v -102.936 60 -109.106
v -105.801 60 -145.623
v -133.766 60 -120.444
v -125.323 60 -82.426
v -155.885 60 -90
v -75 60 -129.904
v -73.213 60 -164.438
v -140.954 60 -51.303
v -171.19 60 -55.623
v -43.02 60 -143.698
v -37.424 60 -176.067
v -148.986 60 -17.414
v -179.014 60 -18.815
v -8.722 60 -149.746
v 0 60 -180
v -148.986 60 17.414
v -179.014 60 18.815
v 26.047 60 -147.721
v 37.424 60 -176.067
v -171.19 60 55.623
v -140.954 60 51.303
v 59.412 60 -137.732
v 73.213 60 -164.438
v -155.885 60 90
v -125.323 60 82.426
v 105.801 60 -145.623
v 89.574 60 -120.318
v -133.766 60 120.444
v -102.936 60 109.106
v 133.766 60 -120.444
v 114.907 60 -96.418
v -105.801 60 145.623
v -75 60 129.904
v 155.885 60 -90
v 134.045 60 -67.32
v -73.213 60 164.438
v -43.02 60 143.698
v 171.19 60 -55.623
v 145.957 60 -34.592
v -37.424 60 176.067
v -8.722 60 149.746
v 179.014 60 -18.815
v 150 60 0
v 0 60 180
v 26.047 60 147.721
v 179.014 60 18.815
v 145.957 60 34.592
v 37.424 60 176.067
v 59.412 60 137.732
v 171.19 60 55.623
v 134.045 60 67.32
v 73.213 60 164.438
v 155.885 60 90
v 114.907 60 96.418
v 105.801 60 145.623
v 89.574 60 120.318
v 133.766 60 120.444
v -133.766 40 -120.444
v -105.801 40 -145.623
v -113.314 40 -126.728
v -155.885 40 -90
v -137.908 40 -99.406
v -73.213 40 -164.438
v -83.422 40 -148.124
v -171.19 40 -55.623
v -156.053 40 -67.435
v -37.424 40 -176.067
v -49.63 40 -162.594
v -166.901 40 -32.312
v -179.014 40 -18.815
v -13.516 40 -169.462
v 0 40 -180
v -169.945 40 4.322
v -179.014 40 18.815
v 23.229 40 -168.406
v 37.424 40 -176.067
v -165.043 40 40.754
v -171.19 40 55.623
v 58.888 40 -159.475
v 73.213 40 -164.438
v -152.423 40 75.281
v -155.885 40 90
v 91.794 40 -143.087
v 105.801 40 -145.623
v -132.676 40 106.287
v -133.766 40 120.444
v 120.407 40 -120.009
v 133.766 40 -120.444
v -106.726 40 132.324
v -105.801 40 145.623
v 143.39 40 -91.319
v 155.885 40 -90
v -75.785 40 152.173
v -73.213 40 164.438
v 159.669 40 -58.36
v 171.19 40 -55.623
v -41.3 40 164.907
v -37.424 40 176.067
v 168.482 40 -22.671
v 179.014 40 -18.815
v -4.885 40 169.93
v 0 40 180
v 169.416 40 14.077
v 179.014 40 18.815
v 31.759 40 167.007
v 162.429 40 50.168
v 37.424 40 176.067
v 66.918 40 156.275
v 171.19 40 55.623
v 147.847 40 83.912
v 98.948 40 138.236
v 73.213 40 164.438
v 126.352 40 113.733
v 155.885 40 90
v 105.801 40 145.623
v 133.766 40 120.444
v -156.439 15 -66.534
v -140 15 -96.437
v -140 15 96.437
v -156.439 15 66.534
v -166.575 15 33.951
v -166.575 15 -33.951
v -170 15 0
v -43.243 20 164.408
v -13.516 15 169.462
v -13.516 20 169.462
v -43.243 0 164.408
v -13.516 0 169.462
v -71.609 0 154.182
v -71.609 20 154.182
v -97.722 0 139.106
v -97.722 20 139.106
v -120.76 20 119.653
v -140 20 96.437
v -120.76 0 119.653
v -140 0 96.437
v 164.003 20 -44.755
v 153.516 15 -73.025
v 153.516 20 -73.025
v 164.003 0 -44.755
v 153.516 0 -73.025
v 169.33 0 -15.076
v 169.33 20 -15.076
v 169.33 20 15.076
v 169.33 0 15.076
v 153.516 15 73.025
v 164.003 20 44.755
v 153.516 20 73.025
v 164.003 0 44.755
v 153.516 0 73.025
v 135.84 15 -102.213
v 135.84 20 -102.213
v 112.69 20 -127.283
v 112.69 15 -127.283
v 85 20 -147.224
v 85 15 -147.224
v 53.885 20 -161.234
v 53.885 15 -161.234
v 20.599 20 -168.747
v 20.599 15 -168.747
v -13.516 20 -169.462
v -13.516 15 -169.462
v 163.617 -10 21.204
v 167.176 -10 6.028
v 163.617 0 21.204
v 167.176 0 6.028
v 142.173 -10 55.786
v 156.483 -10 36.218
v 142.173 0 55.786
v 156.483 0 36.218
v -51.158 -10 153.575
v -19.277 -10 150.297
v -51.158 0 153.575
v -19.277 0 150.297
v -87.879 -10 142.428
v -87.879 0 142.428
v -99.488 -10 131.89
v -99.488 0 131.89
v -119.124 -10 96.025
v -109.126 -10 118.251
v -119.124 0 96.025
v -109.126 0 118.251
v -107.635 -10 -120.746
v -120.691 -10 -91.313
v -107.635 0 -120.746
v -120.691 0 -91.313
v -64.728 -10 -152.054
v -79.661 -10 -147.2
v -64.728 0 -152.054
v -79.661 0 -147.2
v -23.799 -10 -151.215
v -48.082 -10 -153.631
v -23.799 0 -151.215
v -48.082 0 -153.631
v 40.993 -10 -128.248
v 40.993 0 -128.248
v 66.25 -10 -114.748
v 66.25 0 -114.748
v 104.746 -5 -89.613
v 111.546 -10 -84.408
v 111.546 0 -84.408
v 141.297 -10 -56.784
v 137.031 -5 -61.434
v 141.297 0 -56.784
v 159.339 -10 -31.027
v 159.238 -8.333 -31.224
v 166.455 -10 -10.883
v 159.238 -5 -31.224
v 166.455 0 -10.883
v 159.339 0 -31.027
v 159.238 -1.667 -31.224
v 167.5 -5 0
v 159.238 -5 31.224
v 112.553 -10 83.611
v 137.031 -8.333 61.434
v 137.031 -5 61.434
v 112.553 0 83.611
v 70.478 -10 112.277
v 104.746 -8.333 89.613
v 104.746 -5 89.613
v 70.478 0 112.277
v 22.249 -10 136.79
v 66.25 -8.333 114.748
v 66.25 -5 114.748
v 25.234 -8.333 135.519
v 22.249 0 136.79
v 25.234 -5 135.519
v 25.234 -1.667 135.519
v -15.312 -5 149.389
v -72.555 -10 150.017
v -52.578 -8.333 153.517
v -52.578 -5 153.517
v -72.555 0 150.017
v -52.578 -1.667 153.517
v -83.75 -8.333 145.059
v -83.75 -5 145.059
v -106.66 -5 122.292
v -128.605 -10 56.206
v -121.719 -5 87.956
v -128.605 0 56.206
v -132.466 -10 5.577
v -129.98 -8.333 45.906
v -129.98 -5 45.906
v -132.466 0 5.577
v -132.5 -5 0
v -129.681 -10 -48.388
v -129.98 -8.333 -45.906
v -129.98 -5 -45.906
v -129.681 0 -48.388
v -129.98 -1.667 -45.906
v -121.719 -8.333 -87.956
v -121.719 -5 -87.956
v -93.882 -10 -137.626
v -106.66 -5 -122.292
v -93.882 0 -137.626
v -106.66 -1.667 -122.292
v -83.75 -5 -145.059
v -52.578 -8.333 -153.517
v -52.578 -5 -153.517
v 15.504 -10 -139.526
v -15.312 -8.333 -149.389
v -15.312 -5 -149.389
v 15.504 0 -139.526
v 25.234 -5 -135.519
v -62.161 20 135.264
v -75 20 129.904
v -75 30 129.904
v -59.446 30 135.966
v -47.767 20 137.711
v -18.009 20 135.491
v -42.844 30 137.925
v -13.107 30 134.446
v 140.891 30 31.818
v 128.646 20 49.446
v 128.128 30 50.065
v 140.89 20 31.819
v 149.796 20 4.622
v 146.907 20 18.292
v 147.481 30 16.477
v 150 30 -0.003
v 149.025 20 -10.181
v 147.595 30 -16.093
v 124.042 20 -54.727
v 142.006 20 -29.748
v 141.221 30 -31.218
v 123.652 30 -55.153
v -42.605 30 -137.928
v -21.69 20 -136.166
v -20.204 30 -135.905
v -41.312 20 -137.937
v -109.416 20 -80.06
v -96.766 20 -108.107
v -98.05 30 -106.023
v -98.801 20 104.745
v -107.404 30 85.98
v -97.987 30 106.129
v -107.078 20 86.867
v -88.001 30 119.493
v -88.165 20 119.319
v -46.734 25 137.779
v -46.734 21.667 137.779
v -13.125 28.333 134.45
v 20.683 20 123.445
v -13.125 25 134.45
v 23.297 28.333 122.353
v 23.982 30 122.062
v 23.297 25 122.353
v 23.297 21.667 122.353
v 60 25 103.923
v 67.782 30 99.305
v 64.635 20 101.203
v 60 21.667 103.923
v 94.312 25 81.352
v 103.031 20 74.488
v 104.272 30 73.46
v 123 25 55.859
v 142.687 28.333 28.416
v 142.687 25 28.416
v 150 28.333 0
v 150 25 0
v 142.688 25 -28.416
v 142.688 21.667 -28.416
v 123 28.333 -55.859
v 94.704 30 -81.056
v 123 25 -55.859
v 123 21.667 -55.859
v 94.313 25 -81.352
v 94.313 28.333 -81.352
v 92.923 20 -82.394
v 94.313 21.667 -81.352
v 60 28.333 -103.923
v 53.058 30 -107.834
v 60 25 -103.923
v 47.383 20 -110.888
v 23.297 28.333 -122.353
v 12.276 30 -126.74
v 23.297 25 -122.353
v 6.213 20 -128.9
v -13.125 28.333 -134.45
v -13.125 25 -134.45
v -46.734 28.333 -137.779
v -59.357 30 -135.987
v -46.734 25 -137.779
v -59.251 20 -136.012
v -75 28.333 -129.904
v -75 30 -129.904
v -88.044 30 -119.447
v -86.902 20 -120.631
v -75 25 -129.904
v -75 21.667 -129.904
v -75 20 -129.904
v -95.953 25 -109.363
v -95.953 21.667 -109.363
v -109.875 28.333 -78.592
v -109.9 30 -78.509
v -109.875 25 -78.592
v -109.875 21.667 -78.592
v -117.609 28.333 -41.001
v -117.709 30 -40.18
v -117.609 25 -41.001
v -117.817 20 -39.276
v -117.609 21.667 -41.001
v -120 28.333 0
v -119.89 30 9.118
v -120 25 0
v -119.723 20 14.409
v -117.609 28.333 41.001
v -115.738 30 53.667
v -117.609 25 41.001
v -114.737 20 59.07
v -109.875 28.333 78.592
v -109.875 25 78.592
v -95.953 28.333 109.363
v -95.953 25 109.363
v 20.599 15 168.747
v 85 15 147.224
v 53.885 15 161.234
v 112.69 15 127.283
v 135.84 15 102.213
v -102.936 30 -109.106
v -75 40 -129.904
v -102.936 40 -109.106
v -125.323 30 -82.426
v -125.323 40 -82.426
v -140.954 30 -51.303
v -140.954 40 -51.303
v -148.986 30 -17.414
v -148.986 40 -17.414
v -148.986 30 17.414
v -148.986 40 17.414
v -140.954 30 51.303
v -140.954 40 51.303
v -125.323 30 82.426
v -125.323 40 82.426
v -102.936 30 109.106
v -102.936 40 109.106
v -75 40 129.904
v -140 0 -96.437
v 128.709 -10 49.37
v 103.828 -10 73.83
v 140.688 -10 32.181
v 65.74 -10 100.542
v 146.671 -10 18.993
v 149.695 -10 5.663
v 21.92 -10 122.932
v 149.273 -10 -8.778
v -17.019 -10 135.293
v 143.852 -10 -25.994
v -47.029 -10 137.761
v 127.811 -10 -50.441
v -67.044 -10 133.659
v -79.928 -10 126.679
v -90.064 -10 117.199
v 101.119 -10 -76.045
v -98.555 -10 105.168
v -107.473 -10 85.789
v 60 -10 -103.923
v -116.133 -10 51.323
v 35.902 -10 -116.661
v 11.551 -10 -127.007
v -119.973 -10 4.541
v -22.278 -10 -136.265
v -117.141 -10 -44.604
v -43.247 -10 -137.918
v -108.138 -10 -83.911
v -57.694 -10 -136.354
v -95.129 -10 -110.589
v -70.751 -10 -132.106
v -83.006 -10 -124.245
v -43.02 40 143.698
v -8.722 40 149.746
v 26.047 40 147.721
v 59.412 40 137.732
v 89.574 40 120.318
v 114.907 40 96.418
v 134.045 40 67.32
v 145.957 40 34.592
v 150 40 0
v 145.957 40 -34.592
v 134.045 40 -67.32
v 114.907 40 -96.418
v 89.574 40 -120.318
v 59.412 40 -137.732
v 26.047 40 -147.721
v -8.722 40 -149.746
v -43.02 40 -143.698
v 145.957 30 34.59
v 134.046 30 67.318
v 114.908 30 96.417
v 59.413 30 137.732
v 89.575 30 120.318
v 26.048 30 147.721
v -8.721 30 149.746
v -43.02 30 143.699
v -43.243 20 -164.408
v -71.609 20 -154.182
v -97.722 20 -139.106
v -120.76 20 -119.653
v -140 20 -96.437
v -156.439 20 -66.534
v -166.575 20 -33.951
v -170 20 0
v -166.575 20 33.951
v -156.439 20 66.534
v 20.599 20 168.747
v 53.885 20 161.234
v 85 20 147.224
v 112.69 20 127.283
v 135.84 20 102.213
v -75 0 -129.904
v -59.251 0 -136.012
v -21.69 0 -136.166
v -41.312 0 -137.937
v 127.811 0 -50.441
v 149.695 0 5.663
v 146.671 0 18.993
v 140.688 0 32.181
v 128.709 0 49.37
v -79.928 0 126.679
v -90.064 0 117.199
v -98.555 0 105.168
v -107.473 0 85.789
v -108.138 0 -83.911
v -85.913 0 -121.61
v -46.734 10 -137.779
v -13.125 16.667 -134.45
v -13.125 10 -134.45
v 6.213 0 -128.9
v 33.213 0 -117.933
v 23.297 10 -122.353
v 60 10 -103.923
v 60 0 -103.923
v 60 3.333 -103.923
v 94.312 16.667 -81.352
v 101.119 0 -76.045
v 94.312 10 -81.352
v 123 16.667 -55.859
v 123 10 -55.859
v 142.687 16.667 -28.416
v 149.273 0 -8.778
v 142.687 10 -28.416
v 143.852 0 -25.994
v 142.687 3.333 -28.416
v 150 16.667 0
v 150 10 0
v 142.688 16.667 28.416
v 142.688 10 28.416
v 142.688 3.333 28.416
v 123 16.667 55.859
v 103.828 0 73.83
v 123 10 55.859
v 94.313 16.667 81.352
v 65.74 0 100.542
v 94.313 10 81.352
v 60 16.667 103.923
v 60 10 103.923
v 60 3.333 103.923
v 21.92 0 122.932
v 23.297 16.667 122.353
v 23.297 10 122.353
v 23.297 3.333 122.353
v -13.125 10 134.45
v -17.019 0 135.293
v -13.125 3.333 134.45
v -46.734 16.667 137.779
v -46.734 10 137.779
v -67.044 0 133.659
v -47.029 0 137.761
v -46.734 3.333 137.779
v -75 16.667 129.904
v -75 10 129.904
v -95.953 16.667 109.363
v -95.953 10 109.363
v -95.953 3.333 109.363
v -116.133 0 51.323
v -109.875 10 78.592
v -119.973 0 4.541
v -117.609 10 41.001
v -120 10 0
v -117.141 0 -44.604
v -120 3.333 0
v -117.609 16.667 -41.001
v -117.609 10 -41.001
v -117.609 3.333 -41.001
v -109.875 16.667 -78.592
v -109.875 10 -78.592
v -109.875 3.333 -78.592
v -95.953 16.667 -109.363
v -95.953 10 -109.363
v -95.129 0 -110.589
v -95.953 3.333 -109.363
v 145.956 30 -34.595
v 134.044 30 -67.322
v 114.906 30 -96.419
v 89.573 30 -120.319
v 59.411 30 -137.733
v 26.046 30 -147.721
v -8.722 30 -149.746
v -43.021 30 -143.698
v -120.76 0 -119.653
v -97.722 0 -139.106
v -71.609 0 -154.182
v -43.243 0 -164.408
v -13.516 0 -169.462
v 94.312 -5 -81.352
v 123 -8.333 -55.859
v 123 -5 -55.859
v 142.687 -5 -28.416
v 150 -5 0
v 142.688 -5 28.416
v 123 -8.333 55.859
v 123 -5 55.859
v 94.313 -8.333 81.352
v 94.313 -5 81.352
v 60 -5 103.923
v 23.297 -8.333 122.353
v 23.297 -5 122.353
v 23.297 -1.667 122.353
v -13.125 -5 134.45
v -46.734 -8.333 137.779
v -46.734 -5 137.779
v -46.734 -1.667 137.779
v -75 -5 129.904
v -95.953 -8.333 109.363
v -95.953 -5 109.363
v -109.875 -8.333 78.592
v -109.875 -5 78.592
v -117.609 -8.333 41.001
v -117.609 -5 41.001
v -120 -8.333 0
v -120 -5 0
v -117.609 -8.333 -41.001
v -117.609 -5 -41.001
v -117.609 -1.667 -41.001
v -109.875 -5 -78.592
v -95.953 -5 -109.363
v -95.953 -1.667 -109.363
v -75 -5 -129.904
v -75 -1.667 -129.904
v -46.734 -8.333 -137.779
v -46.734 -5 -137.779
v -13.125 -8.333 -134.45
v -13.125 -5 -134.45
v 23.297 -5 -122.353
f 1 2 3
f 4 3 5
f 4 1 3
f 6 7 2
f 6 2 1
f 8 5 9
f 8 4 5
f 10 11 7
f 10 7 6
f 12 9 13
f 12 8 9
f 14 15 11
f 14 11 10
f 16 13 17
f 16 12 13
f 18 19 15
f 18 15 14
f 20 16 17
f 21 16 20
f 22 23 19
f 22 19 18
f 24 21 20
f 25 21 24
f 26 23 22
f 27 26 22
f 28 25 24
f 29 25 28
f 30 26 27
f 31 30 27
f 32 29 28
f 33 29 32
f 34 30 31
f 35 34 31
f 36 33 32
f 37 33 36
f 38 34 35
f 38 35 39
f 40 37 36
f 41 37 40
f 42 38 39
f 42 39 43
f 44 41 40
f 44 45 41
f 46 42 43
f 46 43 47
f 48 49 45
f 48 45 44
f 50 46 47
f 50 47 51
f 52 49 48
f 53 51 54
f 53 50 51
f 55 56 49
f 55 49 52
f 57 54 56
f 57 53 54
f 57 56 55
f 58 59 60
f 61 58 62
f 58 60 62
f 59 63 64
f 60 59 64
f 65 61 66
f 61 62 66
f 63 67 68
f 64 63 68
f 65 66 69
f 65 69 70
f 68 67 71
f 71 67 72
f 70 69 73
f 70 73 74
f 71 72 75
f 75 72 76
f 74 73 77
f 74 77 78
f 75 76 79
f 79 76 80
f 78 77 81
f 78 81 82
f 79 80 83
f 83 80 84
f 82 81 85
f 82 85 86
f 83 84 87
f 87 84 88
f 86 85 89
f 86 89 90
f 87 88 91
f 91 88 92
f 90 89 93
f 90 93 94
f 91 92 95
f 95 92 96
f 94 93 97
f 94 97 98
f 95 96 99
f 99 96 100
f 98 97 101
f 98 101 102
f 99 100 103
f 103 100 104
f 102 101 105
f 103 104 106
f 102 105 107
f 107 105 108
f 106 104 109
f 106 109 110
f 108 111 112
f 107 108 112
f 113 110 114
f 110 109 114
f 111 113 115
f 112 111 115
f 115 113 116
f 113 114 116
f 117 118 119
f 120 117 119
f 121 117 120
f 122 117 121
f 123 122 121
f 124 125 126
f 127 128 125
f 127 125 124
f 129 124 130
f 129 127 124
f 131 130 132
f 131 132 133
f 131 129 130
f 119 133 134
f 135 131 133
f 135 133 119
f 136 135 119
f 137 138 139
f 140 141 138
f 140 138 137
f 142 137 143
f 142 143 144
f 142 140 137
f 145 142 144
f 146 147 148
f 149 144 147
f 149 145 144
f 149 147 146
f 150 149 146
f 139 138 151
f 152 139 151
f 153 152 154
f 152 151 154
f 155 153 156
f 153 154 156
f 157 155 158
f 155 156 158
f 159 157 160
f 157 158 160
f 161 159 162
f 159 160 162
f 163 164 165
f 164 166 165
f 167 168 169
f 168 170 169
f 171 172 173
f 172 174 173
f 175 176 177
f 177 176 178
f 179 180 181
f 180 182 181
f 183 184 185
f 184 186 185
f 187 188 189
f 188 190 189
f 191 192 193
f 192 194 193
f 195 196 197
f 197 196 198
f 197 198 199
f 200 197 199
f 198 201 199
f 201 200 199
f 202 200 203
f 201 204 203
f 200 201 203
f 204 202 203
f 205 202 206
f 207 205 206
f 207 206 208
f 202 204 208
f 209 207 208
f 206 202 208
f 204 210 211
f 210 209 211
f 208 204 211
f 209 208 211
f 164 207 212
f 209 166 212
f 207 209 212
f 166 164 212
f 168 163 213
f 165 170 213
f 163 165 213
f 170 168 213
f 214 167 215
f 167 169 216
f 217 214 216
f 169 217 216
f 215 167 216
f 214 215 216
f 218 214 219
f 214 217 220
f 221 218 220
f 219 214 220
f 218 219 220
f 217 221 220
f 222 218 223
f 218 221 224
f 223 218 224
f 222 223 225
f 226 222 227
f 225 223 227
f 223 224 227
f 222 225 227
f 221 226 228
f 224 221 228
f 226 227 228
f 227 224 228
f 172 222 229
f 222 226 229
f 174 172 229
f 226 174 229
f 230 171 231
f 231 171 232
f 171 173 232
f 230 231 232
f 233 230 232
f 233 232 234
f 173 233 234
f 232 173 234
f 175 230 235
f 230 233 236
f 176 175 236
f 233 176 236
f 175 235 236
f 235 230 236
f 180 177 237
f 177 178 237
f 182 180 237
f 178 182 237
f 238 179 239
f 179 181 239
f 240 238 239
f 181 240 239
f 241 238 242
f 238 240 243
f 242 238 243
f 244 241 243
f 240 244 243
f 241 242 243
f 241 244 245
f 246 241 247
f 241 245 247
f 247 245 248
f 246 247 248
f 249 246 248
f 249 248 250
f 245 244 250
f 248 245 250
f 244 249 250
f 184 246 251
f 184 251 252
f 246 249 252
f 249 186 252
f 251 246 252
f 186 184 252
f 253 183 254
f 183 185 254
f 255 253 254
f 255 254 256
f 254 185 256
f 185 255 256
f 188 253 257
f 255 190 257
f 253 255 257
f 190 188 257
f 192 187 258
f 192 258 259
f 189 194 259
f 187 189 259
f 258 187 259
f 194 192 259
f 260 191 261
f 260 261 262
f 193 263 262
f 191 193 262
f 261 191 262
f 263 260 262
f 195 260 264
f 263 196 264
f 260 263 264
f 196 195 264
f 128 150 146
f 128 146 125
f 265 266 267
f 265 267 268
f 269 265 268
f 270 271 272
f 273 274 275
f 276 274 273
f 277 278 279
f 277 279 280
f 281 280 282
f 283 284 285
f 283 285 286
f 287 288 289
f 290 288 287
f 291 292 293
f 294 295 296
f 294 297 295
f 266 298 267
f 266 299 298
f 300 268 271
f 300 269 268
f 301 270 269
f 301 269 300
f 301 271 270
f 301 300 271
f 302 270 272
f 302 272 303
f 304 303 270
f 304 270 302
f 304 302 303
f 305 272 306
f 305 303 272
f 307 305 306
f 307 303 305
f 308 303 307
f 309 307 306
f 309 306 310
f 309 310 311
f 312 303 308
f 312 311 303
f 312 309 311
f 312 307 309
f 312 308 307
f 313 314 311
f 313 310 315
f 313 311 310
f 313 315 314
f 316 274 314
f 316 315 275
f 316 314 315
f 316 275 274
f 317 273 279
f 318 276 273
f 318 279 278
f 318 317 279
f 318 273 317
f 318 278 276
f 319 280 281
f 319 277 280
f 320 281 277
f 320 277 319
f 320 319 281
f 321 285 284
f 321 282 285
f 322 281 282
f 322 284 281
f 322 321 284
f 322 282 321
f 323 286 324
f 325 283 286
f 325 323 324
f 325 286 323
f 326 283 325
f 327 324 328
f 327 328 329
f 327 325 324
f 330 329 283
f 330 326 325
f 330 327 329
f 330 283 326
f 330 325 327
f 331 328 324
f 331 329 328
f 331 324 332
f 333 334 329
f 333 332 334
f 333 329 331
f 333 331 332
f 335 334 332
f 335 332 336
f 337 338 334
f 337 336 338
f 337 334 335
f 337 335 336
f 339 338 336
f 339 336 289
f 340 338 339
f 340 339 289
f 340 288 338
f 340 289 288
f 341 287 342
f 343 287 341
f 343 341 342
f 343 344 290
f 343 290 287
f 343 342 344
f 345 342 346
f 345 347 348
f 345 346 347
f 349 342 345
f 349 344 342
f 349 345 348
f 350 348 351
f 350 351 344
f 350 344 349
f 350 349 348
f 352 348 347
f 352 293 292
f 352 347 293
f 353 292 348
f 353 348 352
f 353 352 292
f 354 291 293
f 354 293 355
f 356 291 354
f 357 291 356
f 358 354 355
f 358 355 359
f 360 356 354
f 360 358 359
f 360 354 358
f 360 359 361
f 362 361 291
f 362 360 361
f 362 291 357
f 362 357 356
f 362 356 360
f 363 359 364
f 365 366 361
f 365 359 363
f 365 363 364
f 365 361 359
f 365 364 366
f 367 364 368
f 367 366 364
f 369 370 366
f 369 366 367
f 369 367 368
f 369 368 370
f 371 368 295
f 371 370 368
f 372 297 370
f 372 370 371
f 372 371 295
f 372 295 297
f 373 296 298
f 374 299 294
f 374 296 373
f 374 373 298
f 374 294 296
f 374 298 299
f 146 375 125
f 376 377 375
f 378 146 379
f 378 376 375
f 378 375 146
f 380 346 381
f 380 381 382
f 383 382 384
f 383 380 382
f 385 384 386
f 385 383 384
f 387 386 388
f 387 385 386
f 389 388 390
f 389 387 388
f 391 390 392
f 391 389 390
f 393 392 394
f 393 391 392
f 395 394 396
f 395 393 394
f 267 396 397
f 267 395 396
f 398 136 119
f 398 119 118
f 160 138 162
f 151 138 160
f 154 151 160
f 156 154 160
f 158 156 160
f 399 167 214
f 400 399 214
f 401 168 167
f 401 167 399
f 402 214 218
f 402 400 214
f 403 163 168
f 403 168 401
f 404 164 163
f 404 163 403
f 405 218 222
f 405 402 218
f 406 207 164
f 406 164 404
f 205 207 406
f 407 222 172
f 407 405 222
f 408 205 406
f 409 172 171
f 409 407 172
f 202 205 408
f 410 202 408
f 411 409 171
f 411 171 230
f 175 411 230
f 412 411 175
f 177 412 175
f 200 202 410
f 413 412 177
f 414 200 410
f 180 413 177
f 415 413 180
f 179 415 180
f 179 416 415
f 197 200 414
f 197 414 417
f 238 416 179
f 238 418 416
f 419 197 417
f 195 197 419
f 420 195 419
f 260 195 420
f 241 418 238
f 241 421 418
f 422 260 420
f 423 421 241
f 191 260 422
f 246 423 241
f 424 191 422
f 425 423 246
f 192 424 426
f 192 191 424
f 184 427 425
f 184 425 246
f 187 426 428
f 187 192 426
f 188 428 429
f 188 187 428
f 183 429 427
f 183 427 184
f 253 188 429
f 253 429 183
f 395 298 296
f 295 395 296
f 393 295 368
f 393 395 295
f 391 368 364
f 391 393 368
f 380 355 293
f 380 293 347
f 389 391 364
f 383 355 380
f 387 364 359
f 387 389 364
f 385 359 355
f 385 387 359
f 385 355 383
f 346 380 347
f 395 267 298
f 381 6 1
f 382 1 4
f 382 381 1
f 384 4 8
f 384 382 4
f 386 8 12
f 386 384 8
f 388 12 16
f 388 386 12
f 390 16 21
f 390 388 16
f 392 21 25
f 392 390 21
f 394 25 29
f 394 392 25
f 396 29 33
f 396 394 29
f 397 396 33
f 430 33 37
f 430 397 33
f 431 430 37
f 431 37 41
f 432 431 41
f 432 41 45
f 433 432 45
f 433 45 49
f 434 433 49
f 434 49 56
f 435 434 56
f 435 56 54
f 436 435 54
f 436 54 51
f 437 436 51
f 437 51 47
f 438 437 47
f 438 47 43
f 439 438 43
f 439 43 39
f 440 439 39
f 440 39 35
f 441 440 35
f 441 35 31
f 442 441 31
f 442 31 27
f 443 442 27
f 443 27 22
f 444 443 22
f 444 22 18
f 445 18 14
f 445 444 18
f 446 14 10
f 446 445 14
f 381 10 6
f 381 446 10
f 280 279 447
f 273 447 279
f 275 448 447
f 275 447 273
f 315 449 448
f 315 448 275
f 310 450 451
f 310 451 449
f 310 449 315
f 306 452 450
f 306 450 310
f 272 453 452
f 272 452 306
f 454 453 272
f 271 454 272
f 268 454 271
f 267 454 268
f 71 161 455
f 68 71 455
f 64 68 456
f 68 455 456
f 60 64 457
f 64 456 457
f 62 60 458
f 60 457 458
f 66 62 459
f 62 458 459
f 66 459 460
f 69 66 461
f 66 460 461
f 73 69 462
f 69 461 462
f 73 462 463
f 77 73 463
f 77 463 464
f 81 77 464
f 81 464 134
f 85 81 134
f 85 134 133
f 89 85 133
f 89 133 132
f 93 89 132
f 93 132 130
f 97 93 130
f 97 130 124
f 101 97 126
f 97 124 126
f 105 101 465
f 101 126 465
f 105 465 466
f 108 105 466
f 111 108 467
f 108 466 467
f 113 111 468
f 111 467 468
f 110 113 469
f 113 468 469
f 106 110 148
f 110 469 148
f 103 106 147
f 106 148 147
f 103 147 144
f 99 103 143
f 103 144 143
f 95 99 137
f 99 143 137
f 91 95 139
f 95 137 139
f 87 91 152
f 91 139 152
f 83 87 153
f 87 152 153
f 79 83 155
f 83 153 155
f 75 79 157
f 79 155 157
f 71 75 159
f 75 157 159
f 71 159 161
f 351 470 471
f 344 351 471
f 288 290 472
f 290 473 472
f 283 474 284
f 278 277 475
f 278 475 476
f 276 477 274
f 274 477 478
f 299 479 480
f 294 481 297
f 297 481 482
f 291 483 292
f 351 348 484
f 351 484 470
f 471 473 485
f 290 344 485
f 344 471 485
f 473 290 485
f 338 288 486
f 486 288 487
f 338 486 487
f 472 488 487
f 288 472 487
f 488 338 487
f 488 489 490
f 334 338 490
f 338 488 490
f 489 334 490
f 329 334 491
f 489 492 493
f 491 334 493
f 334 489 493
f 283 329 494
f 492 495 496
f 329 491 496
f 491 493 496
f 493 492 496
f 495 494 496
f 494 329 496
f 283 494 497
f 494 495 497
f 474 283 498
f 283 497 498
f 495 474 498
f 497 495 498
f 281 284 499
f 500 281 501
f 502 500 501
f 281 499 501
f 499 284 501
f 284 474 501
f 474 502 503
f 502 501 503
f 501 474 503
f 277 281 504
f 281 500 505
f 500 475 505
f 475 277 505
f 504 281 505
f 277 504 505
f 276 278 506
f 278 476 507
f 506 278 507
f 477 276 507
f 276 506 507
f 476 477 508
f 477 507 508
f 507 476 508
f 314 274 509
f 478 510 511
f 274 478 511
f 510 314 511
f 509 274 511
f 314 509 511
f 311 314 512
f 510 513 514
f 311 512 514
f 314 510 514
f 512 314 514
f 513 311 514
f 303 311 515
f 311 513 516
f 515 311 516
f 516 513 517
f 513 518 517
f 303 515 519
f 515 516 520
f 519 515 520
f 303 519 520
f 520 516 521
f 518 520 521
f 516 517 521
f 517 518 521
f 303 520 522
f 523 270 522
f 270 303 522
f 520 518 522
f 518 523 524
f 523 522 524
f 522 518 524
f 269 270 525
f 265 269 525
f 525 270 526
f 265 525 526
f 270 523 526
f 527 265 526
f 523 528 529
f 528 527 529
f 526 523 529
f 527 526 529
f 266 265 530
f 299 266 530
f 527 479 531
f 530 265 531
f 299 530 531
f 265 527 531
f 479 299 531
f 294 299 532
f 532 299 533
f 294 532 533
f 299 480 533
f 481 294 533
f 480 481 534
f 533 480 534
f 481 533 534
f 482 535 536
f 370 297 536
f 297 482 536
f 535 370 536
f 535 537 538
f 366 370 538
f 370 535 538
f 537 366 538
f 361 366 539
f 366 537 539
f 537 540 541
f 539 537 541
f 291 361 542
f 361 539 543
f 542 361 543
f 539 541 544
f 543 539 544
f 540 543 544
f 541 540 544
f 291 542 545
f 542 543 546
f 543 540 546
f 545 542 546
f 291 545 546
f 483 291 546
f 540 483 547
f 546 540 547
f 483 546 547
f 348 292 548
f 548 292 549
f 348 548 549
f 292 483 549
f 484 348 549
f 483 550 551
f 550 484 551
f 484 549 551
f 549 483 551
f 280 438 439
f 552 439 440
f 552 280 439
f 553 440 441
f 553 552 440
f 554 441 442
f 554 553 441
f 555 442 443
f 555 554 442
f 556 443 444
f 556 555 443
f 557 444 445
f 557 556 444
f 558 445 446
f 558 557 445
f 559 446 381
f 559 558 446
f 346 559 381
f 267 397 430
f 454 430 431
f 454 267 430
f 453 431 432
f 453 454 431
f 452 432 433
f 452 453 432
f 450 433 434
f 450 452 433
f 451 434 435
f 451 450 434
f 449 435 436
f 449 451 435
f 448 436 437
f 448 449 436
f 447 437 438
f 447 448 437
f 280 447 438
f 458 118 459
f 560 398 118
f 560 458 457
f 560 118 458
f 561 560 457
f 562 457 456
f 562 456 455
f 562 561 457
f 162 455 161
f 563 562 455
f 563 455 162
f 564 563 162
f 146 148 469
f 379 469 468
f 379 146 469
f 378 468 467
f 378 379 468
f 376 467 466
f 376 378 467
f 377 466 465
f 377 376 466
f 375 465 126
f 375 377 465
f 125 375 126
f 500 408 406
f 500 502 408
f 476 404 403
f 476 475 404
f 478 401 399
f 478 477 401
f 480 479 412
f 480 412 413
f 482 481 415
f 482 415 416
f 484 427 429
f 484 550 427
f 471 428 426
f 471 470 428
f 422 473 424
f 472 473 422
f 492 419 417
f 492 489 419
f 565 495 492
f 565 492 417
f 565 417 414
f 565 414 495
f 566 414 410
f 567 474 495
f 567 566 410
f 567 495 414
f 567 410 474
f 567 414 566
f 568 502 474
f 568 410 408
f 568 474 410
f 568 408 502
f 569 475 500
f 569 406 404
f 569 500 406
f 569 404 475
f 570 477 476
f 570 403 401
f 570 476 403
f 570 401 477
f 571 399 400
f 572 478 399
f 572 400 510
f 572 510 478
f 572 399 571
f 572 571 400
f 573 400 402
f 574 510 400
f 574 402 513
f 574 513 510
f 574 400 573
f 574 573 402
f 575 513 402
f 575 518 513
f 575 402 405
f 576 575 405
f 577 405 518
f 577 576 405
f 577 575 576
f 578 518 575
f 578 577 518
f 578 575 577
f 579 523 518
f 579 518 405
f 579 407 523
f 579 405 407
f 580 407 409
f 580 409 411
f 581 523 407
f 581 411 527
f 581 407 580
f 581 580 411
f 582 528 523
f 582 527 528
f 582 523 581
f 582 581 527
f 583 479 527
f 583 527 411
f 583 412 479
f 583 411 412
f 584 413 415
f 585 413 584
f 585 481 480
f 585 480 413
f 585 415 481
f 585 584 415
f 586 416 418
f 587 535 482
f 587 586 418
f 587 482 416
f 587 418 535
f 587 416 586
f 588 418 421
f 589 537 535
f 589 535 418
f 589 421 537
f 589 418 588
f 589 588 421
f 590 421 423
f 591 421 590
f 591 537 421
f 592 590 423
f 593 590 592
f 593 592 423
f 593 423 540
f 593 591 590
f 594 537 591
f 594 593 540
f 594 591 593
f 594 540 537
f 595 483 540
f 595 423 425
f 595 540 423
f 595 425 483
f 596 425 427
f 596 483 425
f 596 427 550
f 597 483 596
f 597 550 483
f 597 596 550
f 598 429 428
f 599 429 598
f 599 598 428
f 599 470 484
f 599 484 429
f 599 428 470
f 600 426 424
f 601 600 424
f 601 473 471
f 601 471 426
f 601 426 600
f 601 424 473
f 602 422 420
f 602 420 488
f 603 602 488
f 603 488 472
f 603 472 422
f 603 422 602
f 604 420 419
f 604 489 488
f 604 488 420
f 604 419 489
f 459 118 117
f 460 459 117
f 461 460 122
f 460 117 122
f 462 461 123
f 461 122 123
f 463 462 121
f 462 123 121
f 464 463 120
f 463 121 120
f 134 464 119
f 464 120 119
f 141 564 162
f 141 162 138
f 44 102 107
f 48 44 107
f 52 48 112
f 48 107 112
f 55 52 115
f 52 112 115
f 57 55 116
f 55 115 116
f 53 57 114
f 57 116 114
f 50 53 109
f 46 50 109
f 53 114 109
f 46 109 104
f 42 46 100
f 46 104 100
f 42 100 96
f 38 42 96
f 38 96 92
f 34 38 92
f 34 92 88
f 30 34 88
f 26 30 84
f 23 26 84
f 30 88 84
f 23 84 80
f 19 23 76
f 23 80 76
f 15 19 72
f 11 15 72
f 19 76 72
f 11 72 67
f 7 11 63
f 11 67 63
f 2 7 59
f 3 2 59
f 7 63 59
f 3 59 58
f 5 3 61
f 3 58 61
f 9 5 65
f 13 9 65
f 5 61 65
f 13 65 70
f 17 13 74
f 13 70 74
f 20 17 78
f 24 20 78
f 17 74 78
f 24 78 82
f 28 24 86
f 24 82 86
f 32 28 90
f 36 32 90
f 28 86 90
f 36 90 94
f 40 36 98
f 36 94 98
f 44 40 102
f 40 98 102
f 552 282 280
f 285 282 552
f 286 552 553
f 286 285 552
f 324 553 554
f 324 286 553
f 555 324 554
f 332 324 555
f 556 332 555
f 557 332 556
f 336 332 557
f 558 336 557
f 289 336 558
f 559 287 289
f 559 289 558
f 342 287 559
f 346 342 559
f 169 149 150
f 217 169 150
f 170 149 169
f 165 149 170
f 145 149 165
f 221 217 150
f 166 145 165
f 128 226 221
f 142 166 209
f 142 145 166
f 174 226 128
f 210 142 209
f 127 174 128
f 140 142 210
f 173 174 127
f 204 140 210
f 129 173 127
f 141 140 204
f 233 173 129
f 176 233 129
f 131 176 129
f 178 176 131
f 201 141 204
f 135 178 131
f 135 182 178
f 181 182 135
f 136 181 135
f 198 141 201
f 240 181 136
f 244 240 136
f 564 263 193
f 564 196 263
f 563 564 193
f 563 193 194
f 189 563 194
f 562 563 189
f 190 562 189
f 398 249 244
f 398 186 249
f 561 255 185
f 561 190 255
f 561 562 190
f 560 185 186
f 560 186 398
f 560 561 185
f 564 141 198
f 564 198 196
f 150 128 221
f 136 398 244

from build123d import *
from build123d.topology import SkipClean

# Parameters (mm, degrees)
EXTRUDE_1_DEPTH     = 10
EXTRUDE_2_DEPTH     = 20
SKETCH_6_R          = 170
EXTRUDE_3_DEPTH     = 20
SKETCH_7_R          = 180
SKETCH_7_R_2        = 150
EXTRUDE_4_DEPTH     = 20
EXTRUDE_START       = 5
EXTRUDE_5_DEPTH     = 5
CUT_EXTRUDE_START   = -10
SKETCH_9_R          = 150
CUT_EXTRUDE_1_DEPTH = 10


with BuildPart() as part:
    # 草图2 → 凸台-拉伸1 (new body)
    with BuildSketch(Plane(origin=(0, 0, 0), x_dir=(1, 0, 0), z_dir=(0, 1, 0))):
        with BuildLine():
            add(Edge.make_bspline(
                [(66.25, 114.748366001), (120, 83.715789032), (215, 0), (72.5, -125.573683549), (-107.5, -186.195461814), (-145, 0), (-107.5, 186.195461814), (12.5, 145.78094297), (66.25, 114.748366001)],
                knots=[0, 0, 0, 0, 0.166666667, 0.333333333, 0.5, 0.666666667, 0.833333333, 1, 1, 1, 1], degree=3))
        make_face()
        with BuildLine():
            add(Edge.make_bspline(
                [(60, 103.923048454), (108, 76.210235533), (192, 0), (66, -114.3153533), (-96, -166.276877527), (-132, 0), (-96, 166.276877527), (12, 131.635861375), (60, 103.923048454)],
                knots=[0, 0, 0, 0, 0.166666667, 0.333333333, 0.5, 0.666666667, 0.833333333, 1, 1, 1, 1], degree=3))
        make_face(mode=Mode.SUBTRACT)
    extrude(amount=-EXTRUDE_1_DEPTH)

    # 草图3 → 凸台-拉伸2 (add)
    with BuildSketch(Plane(origin=(0, 0, 0), x_dir=(1, 0, 0), z_dir=(0, 1, 0))):
        with BuildLine():
            Line((-13.516465442, 169.461810335), (153.516465442, 73.025302725))
            ThreePointArc((153.516465442, 73.025302725), (170, 0), (153.516465442, -73.025302725))
            Line((153.516465442, -73.025302725), (-13.516465442, -169.461810335))
            ThreePointArc((-13.516465442, -169.461810335), (-85, -147.224318643), (-140, -96.43650761))
            Line((-140, -96.43650761), (-140, 96.43650761))
            ThreePointArc((-140, 96.43650761), (-85, 147.224318643), (-13.516465442, 169.461810335))
        make_face()
        with BuildLine():
            add(Edge.make_bspline(
                [(-75, 129.903810568), (-42, 148.956369451), (66, 114.3153533), (192, 0), (66, -114.3153533), (-96, -166.276877527), (-132, 0), (-108, 110.851251684), (-75, 129.903810568)],
                knots=[0, 0, 0, 0, 0.166666667, 0.333333333, 0.5, 0.666666667, 0.833333333, 1, 1, 1, 1], degree=3))
        make_face(mode=Mode.SUBTRACT)
    extrude(amount=EXTRUDE_2_DEPTH)

    # 草图6 → 凸台-拉伸3 (add)
    with BuildSketch(Plane(origin=(0, 20, 0), x_dir=(1, 0, 0), z_dir=(0, 1, 0))):
        with Locations(Location((0, 0, 0), (0, 0, 94.56032178))):
            Circle(SKETCH_6_R)
        with BuildLine():
            add(Edge.make_bspline(
                [(-75, -129.903810568), (-42, -148.956369451), (66, -114.3153533), (192, 0), (66, 114.3153533), (-96, 166.276877527), (-132, 0), (-108, -110.851251684), (-75, -129.903810568)],
                knots=[0, 0, 0, 0, 0.166666667, 0.333333333, 0.5, 0.666666667, 0.833333333, 1, 1, 1, 1], degree=3))
        make_face(mode=Mode.SUBTRACT)
    extrude(amount=EXTRUDE_3_DEPTH)

    # 草图7 → 凸台-拉伸4 (add)
    with BuildSketch(Plane(origin=(0, 40, 0), x_dir=(1, 0, 0), z_dir=(0, 1, 0))):
        with Locations(Location((0, 0, 0), (0, 0, 270))):
            Circle(SKETCH_7_R)
        with Locations(Location((0, 0, 0), (0, 0, 120))):
            Circle(SKETCH_7_R_2, mode=Mode.SUBTRACT)
    extrude(amount=EXTRUDE_4_DEPTH)

    # 草图8 → 凸台-拉伸5 (add)
    with SkipClean():  # the faces are left unmerged after this step: merging them gives an invalid solid
        with BuildSketch(Plane.XZ.offset(-20).offset(EXTRUDE_START)):
            with BuildLine():
                Line((-13.516465442, 169.461810335), (153.516465442, 73.025302725))
                ThreePointArc((153.516465442, 73.025302725), (85, 147.224318643), (-13.516465442, 169.461810335))
            make_face()
            with BuildLine():
                Line((-140, 96.43650761), (-140, -96.43650761))
                ThreePointArc((-140, -96.43650761), (-170, 0), (-140, 96.43650761))
            make_face()
            with BuildLine():
                Line((-13.516465442, -169.461810335), (153.516465442, -73.025302725))
                ThreePointArc((153.516465442, -73.025302725), (85, -147.224318643), (-13.516465442, -169.461810335))
            make_face()
        extrude(amount=-EXTRUDE_5_DEPTH)

    # 草图9 → 切除-拉伸1 (cut)
    with SkipClean():  # the faces are left unmerged after this step: merging them gives an invalid solid
        with BuildSketch(Plane(origin=(0, 40, 0), x_dir=(1, 0, 0), z_dir=(0, 1, 0)).offset(CUT_EXTRUDE_START)):
            with Locations(Location((0, 0, 0), (0, 0, 120))):
                Circle(SKETCH_9_R)
        extrude(amount=CUT_EXTRUDE_1_DEPTH, mode=Mode.SUBTRACT)


solid = part.part
